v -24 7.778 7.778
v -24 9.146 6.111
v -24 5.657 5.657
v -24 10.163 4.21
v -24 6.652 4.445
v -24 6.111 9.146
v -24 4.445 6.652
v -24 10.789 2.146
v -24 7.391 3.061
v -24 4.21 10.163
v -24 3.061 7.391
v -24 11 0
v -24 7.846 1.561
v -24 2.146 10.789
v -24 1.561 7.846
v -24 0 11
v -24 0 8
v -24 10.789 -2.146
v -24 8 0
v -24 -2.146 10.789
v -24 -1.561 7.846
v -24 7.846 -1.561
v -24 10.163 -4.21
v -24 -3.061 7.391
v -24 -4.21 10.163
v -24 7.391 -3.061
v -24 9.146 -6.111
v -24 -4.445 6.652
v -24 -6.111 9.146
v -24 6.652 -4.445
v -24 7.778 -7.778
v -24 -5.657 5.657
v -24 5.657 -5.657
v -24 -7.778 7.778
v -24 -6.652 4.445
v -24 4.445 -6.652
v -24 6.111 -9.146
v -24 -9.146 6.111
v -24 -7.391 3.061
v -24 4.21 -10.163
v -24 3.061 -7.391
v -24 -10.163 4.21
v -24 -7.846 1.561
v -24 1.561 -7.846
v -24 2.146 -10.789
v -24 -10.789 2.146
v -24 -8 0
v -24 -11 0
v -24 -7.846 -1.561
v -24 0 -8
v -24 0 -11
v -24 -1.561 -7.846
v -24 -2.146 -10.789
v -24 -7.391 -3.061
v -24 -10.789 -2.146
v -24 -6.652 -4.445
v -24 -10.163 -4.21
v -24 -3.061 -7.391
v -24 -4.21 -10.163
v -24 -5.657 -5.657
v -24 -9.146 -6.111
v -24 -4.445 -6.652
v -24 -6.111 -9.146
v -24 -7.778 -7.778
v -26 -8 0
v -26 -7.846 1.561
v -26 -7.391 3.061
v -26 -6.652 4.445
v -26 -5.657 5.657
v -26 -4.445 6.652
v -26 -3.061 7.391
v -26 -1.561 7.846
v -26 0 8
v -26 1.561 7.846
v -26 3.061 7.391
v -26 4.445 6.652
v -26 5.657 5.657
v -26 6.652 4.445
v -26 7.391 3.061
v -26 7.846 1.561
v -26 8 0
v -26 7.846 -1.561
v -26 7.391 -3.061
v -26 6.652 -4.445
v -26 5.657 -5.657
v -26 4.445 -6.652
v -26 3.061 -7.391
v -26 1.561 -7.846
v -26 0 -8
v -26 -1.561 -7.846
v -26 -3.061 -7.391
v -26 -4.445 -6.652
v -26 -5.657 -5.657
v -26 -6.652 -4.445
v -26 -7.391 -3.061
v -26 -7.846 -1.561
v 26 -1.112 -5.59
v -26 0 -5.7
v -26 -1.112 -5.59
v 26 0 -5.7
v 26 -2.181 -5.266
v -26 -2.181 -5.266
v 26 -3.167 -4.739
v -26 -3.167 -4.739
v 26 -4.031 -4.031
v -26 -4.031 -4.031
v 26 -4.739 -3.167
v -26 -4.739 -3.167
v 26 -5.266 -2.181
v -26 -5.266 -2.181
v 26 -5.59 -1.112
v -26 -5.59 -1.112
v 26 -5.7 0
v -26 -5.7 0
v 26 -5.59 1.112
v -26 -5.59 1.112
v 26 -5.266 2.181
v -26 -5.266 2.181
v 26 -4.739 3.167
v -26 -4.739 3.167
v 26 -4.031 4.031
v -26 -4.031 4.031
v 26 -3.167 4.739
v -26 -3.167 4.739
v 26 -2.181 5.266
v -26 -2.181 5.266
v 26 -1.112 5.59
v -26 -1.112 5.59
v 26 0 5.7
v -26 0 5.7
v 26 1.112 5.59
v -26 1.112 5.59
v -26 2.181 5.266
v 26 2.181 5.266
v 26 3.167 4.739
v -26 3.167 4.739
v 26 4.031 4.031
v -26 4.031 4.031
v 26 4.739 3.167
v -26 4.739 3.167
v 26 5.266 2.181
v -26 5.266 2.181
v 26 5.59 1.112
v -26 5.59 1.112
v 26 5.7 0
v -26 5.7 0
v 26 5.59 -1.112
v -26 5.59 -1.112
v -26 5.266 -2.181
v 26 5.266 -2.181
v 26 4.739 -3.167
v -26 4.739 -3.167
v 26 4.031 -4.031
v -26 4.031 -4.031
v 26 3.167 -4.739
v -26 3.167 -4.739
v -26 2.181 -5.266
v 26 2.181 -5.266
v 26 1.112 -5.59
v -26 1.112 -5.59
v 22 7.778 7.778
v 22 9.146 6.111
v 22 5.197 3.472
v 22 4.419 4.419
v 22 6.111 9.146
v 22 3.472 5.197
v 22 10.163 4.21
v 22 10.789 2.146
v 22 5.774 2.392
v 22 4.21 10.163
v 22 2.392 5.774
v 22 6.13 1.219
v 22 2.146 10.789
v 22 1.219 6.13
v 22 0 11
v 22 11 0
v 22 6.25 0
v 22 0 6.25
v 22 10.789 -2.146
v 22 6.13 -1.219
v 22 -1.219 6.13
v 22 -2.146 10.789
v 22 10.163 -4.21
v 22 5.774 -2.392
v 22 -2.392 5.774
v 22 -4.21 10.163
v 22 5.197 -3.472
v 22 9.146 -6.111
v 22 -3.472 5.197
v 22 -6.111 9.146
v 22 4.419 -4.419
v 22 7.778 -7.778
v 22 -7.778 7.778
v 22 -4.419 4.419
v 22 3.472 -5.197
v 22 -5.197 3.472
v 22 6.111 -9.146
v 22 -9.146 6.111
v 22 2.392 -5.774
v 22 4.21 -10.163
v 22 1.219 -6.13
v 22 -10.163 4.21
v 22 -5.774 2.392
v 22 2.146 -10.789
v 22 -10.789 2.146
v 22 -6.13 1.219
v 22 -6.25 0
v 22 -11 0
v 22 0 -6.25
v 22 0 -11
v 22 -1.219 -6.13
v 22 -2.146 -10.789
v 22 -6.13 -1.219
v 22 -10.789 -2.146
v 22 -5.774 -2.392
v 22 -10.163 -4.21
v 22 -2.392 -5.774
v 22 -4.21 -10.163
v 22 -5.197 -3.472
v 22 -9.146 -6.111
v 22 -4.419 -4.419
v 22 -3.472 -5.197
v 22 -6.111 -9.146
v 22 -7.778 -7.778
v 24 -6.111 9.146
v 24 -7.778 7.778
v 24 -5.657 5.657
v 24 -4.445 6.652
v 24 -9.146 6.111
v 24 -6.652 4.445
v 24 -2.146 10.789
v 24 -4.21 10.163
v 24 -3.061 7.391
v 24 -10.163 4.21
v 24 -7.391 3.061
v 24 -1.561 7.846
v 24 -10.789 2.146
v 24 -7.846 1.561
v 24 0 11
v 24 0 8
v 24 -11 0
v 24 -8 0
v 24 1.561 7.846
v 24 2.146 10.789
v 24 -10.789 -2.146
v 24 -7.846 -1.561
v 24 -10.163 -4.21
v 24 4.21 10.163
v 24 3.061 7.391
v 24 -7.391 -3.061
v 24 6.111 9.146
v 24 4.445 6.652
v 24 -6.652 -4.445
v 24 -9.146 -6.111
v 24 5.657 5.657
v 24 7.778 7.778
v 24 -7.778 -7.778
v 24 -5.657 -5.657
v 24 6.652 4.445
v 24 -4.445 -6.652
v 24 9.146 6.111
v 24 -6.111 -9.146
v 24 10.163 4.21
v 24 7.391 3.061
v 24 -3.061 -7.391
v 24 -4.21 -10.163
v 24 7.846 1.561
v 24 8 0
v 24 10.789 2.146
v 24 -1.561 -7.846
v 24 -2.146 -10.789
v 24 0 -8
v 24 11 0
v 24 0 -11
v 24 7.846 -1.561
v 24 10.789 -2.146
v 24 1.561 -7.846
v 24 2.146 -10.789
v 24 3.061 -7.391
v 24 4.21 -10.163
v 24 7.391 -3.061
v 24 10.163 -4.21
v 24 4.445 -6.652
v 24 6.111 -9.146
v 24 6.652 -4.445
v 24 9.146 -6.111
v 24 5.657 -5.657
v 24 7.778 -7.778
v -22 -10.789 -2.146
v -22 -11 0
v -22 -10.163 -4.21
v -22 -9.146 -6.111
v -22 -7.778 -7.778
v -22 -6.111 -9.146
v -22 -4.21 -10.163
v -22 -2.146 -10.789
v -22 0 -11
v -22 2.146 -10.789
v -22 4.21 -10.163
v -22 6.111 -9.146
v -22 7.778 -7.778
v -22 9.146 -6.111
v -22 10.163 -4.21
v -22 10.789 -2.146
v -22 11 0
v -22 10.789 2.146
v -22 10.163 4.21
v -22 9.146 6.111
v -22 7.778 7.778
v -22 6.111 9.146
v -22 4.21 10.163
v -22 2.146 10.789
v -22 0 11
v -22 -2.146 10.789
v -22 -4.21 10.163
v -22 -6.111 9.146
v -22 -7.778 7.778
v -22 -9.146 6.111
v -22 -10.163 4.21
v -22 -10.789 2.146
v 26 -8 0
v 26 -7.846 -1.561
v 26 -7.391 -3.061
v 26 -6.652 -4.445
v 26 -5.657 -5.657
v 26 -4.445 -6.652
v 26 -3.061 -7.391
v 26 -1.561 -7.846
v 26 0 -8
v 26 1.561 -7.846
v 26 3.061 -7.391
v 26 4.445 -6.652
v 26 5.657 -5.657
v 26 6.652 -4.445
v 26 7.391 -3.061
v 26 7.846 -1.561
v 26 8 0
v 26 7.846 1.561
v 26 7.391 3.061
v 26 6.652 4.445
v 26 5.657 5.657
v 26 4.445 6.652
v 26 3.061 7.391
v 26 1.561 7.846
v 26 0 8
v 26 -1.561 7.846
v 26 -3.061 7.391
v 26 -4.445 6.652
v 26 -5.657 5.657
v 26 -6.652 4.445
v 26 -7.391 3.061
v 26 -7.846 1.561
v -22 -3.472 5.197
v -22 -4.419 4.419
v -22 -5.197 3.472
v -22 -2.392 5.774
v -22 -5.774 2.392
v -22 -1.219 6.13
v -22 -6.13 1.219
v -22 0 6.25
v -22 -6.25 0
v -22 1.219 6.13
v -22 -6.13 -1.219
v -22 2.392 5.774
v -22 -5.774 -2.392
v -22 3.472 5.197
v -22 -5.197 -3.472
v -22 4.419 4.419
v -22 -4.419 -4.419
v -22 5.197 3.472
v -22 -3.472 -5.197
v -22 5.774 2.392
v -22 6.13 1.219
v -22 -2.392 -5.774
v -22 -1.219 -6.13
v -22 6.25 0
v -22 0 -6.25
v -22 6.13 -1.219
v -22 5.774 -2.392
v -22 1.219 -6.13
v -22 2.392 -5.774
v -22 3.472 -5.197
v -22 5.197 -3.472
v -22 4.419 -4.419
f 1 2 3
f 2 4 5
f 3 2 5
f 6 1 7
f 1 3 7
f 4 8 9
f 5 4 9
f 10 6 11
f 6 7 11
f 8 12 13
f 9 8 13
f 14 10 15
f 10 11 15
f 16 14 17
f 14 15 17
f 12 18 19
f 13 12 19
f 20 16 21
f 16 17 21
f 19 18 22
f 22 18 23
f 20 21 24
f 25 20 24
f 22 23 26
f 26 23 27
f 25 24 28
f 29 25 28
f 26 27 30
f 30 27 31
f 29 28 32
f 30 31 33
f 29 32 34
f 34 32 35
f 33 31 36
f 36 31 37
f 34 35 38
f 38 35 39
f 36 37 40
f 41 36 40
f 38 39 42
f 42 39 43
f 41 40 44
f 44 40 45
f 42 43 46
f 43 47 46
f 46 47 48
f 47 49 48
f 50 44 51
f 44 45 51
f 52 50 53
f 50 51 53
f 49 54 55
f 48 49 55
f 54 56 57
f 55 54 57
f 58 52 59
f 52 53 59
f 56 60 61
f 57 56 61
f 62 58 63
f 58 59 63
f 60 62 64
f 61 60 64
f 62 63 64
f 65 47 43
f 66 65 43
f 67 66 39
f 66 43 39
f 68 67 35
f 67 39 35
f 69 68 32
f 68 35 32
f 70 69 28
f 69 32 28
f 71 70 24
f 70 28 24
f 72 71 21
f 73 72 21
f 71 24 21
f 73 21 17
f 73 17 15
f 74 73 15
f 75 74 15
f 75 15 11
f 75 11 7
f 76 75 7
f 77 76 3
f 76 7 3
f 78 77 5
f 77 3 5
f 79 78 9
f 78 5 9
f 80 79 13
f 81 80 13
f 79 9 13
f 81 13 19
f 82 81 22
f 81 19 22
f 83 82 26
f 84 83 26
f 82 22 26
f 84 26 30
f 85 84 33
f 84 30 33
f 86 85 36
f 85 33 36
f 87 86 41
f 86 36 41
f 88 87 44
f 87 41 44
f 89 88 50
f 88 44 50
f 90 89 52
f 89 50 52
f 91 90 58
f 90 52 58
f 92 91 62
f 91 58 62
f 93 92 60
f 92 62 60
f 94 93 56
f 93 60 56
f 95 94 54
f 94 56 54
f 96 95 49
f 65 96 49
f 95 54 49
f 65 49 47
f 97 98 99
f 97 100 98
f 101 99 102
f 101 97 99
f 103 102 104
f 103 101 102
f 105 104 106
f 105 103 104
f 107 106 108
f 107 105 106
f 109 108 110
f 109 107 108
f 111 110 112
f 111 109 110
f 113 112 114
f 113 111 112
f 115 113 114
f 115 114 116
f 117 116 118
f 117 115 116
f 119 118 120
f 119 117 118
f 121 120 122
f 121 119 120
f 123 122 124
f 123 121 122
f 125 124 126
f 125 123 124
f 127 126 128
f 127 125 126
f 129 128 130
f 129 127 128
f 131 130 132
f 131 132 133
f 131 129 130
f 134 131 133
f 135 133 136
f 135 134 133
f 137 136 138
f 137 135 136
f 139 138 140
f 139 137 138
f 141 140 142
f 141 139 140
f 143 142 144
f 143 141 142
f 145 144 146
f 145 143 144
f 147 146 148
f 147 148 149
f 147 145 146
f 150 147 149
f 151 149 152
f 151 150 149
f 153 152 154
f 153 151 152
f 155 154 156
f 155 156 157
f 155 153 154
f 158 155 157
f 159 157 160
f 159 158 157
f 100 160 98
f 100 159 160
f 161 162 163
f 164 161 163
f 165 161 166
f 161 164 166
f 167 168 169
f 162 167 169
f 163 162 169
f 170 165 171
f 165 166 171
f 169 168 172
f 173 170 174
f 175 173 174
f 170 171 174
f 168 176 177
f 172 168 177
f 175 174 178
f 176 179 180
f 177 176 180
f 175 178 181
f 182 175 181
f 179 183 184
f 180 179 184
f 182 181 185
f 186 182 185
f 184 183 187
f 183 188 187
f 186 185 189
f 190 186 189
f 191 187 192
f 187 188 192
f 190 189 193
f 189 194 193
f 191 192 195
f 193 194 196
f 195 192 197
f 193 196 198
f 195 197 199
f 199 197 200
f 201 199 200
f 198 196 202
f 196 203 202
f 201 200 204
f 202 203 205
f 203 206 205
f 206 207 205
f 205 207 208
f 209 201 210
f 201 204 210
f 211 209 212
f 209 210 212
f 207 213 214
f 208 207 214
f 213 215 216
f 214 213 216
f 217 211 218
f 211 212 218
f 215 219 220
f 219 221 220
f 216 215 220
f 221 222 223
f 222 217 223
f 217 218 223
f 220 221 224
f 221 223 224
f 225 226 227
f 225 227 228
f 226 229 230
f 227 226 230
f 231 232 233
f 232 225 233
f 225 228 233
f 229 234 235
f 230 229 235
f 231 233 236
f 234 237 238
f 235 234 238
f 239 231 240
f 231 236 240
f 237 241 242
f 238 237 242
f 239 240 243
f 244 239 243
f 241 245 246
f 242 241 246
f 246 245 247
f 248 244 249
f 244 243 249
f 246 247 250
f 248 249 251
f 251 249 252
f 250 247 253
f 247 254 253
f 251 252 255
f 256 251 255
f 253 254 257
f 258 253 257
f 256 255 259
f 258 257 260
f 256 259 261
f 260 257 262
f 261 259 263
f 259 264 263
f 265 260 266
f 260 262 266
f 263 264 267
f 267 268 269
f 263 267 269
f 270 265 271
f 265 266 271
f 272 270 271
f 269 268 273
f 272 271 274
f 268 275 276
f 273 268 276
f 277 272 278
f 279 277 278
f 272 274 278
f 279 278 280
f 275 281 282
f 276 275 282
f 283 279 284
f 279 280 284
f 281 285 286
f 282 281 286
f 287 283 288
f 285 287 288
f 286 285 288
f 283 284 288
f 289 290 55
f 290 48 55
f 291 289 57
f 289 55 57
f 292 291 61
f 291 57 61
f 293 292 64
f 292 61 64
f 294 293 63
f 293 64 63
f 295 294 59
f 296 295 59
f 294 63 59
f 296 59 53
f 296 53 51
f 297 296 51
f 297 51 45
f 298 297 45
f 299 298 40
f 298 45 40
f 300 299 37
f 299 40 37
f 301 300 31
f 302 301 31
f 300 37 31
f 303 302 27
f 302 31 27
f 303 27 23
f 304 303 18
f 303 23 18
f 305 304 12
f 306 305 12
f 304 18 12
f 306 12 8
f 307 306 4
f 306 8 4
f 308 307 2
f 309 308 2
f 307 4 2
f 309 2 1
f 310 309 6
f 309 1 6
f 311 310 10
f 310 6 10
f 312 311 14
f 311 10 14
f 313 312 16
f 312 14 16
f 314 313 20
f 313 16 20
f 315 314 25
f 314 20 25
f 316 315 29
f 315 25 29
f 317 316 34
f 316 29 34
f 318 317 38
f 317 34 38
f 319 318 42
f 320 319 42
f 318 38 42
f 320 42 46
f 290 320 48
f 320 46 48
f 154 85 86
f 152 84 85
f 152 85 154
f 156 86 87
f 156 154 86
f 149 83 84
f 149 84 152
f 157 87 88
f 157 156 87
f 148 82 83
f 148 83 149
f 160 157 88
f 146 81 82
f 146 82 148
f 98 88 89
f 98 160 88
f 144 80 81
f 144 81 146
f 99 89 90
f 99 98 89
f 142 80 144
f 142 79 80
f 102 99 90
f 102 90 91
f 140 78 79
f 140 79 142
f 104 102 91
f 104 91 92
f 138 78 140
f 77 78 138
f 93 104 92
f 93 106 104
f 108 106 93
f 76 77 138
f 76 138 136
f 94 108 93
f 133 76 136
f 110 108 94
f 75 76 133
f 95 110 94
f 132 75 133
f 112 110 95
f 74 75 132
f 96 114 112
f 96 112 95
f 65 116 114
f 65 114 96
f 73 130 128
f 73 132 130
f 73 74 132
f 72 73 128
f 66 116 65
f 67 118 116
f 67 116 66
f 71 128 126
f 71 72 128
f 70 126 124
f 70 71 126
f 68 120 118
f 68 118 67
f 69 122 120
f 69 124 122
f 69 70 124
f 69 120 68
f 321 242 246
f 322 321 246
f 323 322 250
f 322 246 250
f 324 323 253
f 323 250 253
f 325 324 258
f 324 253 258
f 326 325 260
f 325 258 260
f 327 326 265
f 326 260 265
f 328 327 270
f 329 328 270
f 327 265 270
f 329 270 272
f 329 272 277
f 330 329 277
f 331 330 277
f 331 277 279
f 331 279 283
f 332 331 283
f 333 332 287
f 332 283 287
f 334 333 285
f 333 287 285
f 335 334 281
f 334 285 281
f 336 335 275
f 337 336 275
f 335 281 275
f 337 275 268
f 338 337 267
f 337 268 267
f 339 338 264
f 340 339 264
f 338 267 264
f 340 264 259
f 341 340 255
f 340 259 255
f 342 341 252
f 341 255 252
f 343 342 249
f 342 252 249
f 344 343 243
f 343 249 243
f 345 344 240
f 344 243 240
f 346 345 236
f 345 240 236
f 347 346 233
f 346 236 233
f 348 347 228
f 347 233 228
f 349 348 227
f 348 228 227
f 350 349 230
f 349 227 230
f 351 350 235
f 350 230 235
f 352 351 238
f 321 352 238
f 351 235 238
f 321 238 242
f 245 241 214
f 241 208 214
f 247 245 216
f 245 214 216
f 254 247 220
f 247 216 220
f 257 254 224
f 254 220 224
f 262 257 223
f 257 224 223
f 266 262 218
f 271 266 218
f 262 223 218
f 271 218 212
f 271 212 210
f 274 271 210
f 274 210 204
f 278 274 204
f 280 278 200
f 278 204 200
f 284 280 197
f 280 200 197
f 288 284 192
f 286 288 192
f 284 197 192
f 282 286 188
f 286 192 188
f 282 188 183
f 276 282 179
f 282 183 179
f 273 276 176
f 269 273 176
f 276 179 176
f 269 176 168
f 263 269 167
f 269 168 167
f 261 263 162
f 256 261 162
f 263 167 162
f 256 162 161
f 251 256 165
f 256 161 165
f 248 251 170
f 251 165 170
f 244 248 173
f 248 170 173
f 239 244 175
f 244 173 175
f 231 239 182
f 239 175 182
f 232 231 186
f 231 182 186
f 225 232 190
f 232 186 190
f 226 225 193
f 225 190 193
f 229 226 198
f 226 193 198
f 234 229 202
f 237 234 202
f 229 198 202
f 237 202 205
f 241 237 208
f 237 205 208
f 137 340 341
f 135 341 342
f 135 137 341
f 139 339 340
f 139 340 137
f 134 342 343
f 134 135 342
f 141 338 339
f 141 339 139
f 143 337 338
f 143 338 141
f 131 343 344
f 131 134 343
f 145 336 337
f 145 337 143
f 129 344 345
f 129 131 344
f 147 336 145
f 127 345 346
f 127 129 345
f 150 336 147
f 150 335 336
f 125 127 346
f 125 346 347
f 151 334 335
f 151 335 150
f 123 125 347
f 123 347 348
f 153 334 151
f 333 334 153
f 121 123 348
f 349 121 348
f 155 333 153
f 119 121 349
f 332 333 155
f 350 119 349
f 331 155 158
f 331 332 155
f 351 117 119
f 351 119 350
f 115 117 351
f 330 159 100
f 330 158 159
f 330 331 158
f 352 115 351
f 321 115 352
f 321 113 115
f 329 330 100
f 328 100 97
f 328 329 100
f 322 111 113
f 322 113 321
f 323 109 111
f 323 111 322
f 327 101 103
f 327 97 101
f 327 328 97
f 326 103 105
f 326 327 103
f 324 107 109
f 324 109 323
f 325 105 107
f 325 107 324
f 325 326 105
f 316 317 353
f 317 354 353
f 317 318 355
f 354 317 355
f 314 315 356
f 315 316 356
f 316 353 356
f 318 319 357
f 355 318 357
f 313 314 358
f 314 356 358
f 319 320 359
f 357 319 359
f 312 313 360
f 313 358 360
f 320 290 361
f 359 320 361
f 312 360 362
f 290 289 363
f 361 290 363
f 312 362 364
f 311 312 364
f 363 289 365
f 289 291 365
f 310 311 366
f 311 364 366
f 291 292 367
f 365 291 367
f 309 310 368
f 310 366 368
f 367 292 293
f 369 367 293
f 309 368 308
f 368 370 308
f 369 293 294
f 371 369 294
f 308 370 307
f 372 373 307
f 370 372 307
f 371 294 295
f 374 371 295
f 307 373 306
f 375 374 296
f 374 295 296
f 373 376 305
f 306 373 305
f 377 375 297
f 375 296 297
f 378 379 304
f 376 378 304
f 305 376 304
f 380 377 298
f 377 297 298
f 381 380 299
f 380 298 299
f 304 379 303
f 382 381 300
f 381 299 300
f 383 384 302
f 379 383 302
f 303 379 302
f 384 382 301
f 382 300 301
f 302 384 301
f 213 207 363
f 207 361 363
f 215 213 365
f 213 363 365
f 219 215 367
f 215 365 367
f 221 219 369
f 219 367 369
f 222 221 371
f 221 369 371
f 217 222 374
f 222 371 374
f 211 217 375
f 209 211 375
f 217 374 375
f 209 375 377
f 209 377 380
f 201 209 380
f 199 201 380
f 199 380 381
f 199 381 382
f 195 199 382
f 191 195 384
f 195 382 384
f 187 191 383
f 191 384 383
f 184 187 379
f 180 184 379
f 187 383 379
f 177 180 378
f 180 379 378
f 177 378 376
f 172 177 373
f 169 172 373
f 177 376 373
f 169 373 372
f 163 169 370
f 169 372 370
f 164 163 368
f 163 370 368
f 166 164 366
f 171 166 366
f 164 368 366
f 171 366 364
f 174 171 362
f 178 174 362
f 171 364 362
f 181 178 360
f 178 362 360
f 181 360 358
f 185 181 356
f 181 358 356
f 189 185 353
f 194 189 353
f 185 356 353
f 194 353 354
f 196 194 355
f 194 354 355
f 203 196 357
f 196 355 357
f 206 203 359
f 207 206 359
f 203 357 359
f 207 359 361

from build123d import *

# Parameters (mm, degrees)
SKETCH2_R           = 5.7
CUT_EXTRUDE1_DEPTH  = 51.457903246
SKETCH3_R           = 8
SKETCH3_R_2         = 5.7
BOSS_EXTRUDE1_DEPTH = 2
SKETCH4_R           = 8
SKETCH4_R_2         = 5.7
BOSS_EXTRUDE2_DEPTH = 2


with BuildPart() as part:
    # Sketch1 → Revolve1 (revolve)
    with BuildSketch(Plane.XY, mode=Mode.PRIVATE) as revolve1_sk:
        Polygon((-24, 0), (24, 0), (24, 11), (22, 11), (22, 6.25), (-22, 6.25), (-22, 11), (-24, 11), align=None)
    revolve(revolve1_sk.sketch.rotate(Axis((-24, 0, 0), (1, 0, 0)), 180), axis=Axis((-24, 0, 0), (1, 0, 0)))

    # Sketch2 → Cut-Extrude1 (cut, through all)
    with BuildSketch(Plane(origin=(24, 0, 0), x_dir=(0, 0, -1), z_dir=(1, 0, 0))):
        Circle(SKETCH2_R)
    extrude(amount=-CUT_EXTRUDE1_DEPTH, mode=Mode.SUBTRACT)

    # Sketch3 → Boss-Extrude1 (add)
    with BuildSketch(Plane(origin=(24, 0, 0), x_dir=(0, 0, -1), z_dir=(1, 0, 0))):
        with Locations(Location((0, 0, 0), (0, 0, 270))):
            Circle(SKETCH3_R)
        Circle(SKETCH3_R_2, mode=Mode.SUBTRACT)
    extrude(amount=BOSS_EXTRUDE1_DEPTH)

    # Sketch4 → Boss-Extrude2 (add)
    with BuildSketch(Plane.ZY.offset(24)):
        with Locations(Location((0, 0, 0), (0, 0, 270))):
            Circle(SKETCH4_R)
        with Locations(Location((0, 0, 0), (0, 0, 180))):
            Circle(SKETCH4_R_2, mode=Mode.SUBTRACT)
    extrude(amount=BOSS_EXTRUDE2_DEPTH)


solid = part.part
